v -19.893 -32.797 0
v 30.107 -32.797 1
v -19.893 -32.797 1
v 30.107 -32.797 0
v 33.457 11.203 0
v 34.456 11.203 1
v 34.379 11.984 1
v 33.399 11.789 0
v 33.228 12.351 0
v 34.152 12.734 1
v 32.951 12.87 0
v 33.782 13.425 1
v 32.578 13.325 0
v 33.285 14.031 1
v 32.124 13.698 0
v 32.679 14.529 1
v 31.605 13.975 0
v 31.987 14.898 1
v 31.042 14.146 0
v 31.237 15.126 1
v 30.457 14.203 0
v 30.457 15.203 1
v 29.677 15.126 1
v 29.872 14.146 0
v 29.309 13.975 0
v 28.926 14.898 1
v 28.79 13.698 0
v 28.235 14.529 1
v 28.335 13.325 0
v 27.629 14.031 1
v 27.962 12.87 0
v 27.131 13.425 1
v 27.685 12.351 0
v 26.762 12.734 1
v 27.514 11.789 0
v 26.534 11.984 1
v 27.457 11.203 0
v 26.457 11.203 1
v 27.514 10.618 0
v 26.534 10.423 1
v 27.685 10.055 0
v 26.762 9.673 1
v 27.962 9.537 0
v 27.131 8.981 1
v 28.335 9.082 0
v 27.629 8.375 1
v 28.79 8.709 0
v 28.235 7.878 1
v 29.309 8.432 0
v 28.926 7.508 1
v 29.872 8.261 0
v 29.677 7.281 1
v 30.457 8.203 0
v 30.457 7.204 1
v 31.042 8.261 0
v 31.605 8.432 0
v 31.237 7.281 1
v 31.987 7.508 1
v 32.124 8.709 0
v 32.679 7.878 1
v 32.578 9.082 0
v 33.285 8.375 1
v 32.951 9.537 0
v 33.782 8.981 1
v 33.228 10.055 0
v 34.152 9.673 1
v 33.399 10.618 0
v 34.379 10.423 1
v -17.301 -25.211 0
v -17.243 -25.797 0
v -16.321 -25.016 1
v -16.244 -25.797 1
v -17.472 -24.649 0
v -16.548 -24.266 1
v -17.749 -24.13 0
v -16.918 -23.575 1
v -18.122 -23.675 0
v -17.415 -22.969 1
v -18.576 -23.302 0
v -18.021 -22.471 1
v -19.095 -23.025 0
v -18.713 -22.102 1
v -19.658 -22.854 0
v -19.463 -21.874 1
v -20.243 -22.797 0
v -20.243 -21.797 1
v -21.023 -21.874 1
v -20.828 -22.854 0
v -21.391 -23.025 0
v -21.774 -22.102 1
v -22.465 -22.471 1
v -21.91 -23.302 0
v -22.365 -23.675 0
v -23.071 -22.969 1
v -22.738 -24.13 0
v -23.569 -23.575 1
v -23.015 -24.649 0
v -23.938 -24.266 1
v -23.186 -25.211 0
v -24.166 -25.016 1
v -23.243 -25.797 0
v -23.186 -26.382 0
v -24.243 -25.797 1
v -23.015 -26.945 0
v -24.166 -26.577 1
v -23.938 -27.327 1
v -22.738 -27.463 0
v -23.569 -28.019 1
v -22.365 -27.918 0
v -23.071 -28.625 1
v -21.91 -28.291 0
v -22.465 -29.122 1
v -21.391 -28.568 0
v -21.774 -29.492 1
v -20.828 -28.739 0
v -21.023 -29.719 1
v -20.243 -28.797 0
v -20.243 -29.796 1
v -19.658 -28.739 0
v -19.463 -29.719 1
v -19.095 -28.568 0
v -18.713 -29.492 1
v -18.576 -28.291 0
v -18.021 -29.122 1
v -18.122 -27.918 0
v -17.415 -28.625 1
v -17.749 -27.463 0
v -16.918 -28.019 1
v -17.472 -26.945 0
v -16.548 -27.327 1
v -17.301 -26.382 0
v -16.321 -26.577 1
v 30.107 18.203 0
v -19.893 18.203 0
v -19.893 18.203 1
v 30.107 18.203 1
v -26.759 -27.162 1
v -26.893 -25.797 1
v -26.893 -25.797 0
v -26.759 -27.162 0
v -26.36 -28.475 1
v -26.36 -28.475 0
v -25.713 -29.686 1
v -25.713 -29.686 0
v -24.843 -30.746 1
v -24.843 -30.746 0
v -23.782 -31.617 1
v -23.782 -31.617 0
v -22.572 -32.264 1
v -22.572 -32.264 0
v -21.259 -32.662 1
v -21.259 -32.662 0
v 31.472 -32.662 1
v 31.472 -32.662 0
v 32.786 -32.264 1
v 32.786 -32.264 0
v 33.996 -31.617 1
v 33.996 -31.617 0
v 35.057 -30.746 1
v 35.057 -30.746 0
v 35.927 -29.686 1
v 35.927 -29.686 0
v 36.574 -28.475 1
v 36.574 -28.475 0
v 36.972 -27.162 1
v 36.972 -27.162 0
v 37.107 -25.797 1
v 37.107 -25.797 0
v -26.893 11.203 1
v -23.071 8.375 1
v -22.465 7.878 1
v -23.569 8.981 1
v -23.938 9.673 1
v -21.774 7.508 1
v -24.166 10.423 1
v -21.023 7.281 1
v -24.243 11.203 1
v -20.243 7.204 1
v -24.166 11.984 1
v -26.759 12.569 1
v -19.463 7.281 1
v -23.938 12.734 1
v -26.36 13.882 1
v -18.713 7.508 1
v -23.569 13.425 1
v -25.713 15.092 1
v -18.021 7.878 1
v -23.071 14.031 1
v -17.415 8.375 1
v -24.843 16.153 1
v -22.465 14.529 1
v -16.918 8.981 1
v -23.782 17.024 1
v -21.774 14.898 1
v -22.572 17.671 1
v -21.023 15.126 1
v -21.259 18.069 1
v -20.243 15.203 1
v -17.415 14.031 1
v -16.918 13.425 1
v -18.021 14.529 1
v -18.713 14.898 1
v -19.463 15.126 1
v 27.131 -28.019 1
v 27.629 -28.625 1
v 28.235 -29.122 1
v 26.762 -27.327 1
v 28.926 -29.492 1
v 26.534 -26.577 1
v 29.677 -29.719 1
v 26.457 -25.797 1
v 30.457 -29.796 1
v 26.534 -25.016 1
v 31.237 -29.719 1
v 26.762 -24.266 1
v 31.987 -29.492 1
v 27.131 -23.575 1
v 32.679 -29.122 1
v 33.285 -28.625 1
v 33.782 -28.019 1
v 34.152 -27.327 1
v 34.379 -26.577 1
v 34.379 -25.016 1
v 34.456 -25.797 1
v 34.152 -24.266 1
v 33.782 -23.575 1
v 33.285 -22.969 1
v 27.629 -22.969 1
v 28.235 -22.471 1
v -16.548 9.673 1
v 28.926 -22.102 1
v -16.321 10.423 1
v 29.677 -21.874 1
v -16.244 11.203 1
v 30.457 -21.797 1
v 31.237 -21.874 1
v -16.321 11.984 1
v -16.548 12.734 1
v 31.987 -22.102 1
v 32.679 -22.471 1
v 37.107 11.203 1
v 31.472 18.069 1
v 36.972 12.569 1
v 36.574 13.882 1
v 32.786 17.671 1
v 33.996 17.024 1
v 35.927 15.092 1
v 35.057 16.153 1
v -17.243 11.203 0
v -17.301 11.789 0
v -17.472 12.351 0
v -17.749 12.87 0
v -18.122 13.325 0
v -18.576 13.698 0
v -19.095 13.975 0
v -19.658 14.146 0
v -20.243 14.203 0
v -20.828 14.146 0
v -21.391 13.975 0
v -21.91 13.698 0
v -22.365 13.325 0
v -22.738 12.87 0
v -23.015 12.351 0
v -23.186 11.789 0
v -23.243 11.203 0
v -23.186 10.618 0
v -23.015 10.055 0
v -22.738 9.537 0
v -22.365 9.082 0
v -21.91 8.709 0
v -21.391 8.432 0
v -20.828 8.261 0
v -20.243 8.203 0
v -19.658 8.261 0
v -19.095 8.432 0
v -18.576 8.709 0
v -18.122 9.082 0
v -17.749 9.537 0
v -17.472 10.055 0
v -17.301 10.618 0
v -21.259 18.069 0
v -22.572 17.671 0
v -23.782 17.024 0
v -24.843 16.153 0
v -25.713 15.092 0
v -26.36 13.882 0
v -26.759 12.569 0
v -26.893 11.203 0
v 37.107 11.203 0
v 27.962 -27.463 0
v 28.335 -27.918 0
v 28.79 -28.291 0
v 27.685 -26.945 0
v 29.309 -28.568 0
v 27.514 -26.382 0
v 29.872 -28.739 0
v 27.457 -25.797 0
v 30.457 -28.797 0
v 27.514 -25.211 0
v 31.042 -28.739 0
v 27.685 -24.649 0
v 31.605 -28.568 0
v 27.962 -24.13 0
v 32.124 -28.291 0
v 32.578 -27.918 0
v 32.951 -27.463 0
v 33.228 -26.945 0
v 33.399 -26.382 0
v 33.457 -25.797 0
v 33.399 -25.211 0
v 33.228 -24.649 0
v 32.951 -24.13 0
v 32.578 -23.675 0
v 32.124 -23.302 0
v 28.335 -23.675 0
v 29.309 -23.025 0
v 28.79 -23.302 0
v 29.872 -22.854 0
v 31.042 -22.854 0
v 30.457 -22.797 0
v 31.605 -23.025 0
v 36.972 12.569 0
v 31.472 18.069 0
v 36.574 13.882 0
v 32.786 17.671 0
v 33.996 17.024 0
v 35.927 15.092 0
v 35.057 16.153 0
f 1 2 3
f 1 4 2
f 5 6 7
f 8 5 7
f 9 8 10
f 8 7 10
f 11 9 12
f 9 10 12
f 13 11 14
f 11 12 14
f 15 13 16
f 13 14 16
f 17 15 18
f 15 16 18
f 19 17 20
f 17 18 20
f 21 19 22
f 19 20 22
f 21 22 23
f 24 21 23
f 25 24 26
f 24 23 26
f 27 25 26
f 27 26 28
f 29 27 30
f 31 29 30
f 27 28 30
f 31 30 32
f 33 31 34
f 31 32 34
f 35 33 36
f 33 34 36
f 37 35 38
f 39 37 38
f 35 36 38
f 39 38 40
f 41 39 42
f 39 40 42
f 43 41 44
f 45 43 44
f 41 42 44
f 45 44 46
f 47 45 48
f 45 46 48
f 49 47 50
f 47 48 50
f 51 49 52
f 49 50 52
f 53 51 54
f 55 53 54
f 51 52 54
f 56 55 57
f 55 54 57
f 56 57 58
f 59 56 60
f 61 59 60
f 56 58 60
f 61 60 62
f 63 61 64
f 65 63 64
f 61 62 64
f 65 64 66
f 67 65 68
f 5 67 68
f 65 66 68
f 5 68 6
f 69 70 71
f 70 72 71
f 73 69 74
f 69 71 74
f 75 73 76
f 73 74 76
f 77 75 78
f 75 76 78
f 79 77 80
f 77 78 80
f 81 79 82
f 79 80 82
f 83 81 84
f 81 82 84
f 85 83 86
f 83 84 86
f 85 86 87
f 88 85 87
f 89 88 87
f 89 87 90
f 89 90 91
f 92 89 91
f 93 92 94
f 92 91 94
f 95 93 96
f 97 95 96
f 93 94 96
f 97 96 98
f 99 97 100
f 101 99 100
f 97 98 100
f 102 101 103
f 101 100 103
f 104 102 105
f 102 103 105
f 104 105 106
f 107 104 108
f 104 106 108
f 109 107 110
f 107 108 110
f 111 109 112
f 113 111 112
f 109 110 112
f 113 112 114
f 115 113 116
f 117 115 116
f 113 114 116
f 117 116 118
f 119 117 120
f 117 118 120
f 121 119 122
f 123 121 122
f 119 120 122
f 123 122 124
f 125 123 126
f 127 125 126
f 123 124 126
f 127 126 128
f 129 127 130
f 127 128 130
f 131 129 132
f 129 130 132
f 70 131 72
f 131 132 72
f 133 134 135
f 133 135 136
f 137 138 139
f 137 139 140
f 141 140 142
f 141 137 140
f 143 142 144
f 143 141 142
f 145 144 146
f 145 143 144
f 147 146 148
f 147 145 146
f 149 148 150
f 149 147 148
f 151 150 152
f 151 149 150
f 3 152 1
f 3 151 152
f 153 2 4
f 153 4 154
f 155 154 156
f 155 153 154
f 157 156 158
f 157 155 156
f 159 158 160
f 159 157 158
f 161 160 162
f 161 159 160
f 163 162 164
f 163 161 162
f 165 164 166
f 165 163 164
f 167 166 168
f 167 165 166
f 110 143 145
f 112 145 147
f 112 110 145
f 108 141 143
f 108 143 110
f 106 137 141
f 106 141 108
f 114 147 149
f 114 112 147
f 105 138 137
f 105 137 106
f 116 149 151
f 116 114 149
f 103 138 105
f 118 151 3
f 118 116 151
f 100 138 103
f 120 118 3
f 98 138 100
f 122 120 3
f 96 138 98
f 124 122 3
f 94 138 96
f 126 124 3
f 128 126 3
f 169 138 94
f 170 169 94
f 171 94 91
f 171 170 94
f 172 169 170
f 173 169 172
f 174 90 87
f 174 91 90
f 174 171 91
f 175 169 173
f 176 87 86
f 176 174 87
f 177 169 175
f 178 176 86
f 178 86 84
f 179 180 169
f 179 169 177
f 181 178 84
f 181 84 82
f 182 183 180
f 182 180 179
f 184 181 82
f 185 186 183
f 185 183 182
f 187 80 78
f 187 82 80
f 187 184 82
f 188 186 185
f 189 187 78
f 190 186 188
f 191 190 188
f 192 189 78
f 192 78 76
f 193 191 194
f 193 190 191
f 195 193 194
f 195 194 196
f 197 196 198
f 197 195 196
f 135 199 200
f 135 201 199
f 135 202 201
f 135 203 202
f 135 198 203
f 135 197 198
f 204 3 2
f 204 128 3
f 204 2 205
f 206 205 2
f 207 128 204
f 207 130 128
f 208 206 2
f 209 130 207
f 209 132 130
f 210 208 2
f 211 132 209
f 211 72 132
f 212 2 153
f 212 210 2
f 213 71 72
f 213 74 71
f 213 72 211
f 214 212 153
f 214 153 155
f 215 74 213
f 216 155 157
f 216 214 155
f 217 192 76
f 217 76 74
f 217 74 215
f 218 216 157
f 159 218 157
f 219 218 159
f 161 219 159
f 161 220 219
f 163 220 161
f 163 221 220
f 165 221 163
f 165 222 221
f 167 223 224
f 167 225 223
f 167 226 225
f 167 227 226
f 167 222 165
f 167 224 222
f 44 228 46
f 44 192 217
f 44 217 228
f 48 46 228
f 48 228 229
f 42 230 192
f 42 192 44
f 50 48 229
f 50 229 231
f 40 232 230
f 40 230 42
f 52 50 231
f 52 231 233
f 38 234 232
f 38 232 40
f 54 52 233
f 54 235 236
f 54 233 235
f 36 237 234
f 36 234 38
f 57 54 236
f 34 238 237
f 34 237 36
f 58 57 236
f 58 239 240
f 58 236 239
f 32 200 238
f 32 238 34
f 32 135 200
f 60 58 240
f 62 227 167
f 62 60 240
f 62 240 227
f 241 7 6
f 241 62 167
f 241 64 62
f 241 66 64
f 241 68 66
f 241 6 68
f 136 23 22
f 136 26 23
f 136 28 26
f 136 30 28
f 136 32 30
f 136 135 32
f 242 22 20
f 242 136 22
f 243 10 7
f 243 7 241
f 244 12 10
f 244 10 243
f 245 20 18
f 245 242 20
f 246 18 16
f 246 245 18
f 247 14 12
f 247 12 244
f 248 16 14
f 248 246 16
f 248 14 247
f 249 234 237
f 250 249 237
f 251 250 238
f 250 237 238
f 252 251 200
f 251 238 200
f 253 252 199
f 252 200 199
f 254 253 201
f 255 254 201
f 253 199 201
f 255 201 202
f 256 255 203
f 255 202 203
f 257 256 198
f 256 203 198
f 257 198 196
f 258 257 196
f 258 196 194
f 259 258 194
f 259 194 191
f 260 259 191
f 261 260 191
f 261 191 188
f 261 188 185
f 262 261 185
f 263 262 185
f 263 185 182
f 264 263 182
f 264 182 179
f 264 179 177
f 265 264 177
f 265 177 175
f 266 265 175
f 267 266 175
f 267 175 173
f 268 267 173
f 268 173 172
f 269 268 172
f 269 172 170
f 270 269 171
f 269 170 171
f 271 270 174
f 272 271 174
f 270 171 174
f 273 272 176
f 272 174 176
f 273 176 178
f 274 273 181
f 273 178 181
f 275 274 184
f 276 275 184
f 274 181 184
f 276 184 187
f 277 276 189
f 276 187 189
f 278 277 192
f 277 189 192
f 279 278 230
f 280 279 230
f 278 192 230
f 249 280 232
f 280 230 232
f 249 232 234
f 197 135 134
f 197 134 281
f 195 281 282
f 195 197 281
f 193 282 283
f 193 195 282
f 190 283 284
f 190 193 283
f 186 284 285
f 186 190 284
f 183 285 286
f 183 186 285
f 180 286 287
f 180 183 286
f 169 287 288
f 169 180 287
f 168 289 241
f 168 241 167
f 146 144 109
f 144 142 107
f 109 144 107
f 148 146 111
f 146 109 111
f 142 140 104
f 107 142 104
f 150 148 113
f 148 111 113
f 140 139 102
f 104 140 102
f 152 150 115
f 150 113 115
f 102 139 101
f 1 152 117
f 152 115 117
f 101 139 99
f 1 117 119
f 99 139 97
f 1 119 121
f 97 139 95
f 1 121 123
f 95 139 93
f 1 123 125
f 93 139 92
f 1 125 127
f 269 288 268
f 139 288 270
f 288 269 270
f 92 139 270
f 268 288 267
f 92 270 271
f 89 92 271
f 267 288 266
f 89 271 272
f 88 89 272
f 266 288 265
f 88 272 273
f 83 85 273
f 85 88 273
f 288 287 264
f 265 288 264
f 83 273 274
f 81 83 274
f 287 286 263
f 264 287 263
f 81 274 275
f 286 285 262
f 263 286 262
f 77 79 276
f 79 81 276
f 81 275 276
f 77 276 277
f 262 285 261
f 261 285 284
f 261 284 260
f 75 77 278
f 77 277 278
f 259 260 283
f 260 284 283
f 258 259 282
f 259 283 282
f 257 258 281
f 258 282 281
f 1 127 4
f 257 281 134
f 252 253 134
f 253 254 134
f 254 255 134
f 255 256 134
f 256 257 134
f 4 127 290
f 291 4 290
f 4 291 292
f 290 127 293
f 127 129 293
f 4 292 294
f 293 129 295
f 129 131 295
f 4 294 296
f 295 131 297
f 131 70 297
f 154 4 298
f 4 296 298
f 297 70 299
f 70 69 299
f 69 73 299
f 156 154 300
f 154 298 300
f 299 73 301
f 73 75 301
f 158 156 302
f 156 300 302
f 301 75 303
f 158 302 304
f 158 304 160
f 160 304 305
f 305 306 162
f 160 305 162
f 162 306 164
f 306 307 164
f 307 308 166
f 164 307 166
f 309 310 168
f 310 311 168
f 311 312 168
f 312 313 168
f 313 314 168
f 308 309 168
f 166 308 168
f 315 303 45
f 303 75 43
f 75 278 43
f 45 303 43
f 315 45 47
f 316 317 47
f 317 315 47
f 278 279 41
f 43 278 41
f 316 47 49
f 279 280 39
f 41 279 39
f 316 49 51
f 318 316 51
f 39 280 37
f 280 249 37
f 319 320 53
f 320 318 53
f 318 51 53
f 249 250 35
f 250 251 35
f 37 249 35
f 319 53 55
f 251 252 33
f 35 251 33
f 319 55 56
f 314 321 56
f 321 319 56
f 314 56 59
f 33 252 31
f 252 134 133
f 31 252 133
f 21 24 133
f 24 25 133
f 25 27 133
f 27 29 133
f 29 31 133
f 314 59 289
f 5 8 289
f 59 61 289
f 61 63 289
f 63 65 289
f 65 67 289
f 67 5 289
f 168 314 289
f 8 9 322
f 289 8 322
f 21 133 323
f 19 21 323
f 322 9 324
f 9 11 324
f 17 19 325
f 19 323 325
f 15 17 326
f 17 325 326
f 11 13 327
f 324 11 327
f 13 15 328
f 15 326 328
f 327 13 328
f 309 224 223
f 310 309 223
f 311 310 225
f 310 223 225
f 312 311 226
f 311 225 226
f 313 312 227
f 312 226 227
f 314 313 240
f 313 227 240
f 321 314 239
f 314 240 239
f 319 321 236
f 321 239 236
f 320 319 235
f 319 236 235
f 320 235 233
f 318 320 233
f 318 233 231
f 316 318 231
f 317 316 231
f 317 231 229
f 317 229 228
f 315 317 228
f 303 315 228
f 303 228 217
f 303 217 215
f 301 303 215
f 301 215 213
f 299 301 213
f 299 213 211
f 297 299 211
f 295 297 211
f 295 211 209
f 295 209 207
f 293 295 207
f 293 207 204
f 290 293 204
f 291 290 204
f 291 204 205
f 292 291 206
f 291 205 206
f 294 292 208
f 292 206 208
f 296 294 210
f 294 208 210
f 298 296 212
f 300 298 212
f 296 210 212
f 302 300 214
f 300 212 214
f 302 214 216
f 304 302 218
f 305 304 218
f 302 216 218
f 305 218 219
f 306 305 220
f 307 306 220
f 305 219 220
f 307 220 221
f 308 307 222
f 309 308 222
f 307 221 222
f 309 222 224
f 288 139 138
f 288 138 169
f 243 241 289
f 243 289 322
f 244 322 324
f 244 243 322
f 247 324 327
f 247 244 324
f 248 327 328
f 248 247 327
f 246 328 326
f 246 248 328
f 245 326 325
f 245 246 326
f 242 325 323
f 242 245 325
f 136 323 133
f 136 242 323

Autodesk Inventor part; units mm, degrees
ref_plane "YZ Plane" through (0, 0, 0) normal (1, 0, 0) x (0, 1, 0)
ref_plane "XZ Plane" through (0, 0, 0) normal (0, 1, 0) x (-1, 0, 0)
ref_plane "XY Plane" through (0, 0, 0) normal (0, 0, 1) x (1, 0, 0)
sketch "Esboço1" plane through (0, 0, 0) normal (0, 0, 1) x (1, 0, 0)
  line L0 (-26.8932, 18.2034) -> (37.1068, 18.2034)
  line L1 (37.1068, 18.2034) -> (37.1068, -32.7966)
  line L2 (37.1068, -32.7966) -> (-26.8932, -32.7966)
  line L3 (-26.8932, -32.7966) -> (-26.8932, 18.2034)
  circle A0 centre (-20.2432, 11.2034) radius 3
  circle A1 centre (-20.2432, -25.7966) radius 3
  circle A2 centre (30.4568, -25.7966) radius 3
  circle A3 centre (30.4568, 11.2034) radius 3
  dimension "d9" = 64
  dimension "d10" = 51
  dimension "d15" = 6
  dimension "d16" = 6
  dimension "d17" = 6
  dimension "d18" = 6
  dimension "d26" = 50.7
  dimension "d27" = 37
  dimension "d28" = 50.7
  dimension "d29" = 37
  dimension "d31" = 6.65
  dimension "d33" = 6.65
  dimension "d34" = 7
  dimension "d36" = 7
  dimension "d37" = 7
  dimension "d38" = 7
extrude "Extrusão1" add sketch "Esboço1" along normal blind 1
chamfer "Chanfro1" distance 1 angle 45 4 edges at (-23.2432, -25.7966, 1) (-23.2432, 11.2034, 1) (27.4568, 11.2034, 1) (27.4568, -25.7966, 1)
fillet "Arredondamento2" radius 7 4 edges at (-26.8932, -32.7966, 0.5) (37.1068, -32.7966, 0.5) (37.1068, 18.2034, 0.5) (-26.8932, 18.2034, 0.5)
properties part number "alguma parte da guitarra"
